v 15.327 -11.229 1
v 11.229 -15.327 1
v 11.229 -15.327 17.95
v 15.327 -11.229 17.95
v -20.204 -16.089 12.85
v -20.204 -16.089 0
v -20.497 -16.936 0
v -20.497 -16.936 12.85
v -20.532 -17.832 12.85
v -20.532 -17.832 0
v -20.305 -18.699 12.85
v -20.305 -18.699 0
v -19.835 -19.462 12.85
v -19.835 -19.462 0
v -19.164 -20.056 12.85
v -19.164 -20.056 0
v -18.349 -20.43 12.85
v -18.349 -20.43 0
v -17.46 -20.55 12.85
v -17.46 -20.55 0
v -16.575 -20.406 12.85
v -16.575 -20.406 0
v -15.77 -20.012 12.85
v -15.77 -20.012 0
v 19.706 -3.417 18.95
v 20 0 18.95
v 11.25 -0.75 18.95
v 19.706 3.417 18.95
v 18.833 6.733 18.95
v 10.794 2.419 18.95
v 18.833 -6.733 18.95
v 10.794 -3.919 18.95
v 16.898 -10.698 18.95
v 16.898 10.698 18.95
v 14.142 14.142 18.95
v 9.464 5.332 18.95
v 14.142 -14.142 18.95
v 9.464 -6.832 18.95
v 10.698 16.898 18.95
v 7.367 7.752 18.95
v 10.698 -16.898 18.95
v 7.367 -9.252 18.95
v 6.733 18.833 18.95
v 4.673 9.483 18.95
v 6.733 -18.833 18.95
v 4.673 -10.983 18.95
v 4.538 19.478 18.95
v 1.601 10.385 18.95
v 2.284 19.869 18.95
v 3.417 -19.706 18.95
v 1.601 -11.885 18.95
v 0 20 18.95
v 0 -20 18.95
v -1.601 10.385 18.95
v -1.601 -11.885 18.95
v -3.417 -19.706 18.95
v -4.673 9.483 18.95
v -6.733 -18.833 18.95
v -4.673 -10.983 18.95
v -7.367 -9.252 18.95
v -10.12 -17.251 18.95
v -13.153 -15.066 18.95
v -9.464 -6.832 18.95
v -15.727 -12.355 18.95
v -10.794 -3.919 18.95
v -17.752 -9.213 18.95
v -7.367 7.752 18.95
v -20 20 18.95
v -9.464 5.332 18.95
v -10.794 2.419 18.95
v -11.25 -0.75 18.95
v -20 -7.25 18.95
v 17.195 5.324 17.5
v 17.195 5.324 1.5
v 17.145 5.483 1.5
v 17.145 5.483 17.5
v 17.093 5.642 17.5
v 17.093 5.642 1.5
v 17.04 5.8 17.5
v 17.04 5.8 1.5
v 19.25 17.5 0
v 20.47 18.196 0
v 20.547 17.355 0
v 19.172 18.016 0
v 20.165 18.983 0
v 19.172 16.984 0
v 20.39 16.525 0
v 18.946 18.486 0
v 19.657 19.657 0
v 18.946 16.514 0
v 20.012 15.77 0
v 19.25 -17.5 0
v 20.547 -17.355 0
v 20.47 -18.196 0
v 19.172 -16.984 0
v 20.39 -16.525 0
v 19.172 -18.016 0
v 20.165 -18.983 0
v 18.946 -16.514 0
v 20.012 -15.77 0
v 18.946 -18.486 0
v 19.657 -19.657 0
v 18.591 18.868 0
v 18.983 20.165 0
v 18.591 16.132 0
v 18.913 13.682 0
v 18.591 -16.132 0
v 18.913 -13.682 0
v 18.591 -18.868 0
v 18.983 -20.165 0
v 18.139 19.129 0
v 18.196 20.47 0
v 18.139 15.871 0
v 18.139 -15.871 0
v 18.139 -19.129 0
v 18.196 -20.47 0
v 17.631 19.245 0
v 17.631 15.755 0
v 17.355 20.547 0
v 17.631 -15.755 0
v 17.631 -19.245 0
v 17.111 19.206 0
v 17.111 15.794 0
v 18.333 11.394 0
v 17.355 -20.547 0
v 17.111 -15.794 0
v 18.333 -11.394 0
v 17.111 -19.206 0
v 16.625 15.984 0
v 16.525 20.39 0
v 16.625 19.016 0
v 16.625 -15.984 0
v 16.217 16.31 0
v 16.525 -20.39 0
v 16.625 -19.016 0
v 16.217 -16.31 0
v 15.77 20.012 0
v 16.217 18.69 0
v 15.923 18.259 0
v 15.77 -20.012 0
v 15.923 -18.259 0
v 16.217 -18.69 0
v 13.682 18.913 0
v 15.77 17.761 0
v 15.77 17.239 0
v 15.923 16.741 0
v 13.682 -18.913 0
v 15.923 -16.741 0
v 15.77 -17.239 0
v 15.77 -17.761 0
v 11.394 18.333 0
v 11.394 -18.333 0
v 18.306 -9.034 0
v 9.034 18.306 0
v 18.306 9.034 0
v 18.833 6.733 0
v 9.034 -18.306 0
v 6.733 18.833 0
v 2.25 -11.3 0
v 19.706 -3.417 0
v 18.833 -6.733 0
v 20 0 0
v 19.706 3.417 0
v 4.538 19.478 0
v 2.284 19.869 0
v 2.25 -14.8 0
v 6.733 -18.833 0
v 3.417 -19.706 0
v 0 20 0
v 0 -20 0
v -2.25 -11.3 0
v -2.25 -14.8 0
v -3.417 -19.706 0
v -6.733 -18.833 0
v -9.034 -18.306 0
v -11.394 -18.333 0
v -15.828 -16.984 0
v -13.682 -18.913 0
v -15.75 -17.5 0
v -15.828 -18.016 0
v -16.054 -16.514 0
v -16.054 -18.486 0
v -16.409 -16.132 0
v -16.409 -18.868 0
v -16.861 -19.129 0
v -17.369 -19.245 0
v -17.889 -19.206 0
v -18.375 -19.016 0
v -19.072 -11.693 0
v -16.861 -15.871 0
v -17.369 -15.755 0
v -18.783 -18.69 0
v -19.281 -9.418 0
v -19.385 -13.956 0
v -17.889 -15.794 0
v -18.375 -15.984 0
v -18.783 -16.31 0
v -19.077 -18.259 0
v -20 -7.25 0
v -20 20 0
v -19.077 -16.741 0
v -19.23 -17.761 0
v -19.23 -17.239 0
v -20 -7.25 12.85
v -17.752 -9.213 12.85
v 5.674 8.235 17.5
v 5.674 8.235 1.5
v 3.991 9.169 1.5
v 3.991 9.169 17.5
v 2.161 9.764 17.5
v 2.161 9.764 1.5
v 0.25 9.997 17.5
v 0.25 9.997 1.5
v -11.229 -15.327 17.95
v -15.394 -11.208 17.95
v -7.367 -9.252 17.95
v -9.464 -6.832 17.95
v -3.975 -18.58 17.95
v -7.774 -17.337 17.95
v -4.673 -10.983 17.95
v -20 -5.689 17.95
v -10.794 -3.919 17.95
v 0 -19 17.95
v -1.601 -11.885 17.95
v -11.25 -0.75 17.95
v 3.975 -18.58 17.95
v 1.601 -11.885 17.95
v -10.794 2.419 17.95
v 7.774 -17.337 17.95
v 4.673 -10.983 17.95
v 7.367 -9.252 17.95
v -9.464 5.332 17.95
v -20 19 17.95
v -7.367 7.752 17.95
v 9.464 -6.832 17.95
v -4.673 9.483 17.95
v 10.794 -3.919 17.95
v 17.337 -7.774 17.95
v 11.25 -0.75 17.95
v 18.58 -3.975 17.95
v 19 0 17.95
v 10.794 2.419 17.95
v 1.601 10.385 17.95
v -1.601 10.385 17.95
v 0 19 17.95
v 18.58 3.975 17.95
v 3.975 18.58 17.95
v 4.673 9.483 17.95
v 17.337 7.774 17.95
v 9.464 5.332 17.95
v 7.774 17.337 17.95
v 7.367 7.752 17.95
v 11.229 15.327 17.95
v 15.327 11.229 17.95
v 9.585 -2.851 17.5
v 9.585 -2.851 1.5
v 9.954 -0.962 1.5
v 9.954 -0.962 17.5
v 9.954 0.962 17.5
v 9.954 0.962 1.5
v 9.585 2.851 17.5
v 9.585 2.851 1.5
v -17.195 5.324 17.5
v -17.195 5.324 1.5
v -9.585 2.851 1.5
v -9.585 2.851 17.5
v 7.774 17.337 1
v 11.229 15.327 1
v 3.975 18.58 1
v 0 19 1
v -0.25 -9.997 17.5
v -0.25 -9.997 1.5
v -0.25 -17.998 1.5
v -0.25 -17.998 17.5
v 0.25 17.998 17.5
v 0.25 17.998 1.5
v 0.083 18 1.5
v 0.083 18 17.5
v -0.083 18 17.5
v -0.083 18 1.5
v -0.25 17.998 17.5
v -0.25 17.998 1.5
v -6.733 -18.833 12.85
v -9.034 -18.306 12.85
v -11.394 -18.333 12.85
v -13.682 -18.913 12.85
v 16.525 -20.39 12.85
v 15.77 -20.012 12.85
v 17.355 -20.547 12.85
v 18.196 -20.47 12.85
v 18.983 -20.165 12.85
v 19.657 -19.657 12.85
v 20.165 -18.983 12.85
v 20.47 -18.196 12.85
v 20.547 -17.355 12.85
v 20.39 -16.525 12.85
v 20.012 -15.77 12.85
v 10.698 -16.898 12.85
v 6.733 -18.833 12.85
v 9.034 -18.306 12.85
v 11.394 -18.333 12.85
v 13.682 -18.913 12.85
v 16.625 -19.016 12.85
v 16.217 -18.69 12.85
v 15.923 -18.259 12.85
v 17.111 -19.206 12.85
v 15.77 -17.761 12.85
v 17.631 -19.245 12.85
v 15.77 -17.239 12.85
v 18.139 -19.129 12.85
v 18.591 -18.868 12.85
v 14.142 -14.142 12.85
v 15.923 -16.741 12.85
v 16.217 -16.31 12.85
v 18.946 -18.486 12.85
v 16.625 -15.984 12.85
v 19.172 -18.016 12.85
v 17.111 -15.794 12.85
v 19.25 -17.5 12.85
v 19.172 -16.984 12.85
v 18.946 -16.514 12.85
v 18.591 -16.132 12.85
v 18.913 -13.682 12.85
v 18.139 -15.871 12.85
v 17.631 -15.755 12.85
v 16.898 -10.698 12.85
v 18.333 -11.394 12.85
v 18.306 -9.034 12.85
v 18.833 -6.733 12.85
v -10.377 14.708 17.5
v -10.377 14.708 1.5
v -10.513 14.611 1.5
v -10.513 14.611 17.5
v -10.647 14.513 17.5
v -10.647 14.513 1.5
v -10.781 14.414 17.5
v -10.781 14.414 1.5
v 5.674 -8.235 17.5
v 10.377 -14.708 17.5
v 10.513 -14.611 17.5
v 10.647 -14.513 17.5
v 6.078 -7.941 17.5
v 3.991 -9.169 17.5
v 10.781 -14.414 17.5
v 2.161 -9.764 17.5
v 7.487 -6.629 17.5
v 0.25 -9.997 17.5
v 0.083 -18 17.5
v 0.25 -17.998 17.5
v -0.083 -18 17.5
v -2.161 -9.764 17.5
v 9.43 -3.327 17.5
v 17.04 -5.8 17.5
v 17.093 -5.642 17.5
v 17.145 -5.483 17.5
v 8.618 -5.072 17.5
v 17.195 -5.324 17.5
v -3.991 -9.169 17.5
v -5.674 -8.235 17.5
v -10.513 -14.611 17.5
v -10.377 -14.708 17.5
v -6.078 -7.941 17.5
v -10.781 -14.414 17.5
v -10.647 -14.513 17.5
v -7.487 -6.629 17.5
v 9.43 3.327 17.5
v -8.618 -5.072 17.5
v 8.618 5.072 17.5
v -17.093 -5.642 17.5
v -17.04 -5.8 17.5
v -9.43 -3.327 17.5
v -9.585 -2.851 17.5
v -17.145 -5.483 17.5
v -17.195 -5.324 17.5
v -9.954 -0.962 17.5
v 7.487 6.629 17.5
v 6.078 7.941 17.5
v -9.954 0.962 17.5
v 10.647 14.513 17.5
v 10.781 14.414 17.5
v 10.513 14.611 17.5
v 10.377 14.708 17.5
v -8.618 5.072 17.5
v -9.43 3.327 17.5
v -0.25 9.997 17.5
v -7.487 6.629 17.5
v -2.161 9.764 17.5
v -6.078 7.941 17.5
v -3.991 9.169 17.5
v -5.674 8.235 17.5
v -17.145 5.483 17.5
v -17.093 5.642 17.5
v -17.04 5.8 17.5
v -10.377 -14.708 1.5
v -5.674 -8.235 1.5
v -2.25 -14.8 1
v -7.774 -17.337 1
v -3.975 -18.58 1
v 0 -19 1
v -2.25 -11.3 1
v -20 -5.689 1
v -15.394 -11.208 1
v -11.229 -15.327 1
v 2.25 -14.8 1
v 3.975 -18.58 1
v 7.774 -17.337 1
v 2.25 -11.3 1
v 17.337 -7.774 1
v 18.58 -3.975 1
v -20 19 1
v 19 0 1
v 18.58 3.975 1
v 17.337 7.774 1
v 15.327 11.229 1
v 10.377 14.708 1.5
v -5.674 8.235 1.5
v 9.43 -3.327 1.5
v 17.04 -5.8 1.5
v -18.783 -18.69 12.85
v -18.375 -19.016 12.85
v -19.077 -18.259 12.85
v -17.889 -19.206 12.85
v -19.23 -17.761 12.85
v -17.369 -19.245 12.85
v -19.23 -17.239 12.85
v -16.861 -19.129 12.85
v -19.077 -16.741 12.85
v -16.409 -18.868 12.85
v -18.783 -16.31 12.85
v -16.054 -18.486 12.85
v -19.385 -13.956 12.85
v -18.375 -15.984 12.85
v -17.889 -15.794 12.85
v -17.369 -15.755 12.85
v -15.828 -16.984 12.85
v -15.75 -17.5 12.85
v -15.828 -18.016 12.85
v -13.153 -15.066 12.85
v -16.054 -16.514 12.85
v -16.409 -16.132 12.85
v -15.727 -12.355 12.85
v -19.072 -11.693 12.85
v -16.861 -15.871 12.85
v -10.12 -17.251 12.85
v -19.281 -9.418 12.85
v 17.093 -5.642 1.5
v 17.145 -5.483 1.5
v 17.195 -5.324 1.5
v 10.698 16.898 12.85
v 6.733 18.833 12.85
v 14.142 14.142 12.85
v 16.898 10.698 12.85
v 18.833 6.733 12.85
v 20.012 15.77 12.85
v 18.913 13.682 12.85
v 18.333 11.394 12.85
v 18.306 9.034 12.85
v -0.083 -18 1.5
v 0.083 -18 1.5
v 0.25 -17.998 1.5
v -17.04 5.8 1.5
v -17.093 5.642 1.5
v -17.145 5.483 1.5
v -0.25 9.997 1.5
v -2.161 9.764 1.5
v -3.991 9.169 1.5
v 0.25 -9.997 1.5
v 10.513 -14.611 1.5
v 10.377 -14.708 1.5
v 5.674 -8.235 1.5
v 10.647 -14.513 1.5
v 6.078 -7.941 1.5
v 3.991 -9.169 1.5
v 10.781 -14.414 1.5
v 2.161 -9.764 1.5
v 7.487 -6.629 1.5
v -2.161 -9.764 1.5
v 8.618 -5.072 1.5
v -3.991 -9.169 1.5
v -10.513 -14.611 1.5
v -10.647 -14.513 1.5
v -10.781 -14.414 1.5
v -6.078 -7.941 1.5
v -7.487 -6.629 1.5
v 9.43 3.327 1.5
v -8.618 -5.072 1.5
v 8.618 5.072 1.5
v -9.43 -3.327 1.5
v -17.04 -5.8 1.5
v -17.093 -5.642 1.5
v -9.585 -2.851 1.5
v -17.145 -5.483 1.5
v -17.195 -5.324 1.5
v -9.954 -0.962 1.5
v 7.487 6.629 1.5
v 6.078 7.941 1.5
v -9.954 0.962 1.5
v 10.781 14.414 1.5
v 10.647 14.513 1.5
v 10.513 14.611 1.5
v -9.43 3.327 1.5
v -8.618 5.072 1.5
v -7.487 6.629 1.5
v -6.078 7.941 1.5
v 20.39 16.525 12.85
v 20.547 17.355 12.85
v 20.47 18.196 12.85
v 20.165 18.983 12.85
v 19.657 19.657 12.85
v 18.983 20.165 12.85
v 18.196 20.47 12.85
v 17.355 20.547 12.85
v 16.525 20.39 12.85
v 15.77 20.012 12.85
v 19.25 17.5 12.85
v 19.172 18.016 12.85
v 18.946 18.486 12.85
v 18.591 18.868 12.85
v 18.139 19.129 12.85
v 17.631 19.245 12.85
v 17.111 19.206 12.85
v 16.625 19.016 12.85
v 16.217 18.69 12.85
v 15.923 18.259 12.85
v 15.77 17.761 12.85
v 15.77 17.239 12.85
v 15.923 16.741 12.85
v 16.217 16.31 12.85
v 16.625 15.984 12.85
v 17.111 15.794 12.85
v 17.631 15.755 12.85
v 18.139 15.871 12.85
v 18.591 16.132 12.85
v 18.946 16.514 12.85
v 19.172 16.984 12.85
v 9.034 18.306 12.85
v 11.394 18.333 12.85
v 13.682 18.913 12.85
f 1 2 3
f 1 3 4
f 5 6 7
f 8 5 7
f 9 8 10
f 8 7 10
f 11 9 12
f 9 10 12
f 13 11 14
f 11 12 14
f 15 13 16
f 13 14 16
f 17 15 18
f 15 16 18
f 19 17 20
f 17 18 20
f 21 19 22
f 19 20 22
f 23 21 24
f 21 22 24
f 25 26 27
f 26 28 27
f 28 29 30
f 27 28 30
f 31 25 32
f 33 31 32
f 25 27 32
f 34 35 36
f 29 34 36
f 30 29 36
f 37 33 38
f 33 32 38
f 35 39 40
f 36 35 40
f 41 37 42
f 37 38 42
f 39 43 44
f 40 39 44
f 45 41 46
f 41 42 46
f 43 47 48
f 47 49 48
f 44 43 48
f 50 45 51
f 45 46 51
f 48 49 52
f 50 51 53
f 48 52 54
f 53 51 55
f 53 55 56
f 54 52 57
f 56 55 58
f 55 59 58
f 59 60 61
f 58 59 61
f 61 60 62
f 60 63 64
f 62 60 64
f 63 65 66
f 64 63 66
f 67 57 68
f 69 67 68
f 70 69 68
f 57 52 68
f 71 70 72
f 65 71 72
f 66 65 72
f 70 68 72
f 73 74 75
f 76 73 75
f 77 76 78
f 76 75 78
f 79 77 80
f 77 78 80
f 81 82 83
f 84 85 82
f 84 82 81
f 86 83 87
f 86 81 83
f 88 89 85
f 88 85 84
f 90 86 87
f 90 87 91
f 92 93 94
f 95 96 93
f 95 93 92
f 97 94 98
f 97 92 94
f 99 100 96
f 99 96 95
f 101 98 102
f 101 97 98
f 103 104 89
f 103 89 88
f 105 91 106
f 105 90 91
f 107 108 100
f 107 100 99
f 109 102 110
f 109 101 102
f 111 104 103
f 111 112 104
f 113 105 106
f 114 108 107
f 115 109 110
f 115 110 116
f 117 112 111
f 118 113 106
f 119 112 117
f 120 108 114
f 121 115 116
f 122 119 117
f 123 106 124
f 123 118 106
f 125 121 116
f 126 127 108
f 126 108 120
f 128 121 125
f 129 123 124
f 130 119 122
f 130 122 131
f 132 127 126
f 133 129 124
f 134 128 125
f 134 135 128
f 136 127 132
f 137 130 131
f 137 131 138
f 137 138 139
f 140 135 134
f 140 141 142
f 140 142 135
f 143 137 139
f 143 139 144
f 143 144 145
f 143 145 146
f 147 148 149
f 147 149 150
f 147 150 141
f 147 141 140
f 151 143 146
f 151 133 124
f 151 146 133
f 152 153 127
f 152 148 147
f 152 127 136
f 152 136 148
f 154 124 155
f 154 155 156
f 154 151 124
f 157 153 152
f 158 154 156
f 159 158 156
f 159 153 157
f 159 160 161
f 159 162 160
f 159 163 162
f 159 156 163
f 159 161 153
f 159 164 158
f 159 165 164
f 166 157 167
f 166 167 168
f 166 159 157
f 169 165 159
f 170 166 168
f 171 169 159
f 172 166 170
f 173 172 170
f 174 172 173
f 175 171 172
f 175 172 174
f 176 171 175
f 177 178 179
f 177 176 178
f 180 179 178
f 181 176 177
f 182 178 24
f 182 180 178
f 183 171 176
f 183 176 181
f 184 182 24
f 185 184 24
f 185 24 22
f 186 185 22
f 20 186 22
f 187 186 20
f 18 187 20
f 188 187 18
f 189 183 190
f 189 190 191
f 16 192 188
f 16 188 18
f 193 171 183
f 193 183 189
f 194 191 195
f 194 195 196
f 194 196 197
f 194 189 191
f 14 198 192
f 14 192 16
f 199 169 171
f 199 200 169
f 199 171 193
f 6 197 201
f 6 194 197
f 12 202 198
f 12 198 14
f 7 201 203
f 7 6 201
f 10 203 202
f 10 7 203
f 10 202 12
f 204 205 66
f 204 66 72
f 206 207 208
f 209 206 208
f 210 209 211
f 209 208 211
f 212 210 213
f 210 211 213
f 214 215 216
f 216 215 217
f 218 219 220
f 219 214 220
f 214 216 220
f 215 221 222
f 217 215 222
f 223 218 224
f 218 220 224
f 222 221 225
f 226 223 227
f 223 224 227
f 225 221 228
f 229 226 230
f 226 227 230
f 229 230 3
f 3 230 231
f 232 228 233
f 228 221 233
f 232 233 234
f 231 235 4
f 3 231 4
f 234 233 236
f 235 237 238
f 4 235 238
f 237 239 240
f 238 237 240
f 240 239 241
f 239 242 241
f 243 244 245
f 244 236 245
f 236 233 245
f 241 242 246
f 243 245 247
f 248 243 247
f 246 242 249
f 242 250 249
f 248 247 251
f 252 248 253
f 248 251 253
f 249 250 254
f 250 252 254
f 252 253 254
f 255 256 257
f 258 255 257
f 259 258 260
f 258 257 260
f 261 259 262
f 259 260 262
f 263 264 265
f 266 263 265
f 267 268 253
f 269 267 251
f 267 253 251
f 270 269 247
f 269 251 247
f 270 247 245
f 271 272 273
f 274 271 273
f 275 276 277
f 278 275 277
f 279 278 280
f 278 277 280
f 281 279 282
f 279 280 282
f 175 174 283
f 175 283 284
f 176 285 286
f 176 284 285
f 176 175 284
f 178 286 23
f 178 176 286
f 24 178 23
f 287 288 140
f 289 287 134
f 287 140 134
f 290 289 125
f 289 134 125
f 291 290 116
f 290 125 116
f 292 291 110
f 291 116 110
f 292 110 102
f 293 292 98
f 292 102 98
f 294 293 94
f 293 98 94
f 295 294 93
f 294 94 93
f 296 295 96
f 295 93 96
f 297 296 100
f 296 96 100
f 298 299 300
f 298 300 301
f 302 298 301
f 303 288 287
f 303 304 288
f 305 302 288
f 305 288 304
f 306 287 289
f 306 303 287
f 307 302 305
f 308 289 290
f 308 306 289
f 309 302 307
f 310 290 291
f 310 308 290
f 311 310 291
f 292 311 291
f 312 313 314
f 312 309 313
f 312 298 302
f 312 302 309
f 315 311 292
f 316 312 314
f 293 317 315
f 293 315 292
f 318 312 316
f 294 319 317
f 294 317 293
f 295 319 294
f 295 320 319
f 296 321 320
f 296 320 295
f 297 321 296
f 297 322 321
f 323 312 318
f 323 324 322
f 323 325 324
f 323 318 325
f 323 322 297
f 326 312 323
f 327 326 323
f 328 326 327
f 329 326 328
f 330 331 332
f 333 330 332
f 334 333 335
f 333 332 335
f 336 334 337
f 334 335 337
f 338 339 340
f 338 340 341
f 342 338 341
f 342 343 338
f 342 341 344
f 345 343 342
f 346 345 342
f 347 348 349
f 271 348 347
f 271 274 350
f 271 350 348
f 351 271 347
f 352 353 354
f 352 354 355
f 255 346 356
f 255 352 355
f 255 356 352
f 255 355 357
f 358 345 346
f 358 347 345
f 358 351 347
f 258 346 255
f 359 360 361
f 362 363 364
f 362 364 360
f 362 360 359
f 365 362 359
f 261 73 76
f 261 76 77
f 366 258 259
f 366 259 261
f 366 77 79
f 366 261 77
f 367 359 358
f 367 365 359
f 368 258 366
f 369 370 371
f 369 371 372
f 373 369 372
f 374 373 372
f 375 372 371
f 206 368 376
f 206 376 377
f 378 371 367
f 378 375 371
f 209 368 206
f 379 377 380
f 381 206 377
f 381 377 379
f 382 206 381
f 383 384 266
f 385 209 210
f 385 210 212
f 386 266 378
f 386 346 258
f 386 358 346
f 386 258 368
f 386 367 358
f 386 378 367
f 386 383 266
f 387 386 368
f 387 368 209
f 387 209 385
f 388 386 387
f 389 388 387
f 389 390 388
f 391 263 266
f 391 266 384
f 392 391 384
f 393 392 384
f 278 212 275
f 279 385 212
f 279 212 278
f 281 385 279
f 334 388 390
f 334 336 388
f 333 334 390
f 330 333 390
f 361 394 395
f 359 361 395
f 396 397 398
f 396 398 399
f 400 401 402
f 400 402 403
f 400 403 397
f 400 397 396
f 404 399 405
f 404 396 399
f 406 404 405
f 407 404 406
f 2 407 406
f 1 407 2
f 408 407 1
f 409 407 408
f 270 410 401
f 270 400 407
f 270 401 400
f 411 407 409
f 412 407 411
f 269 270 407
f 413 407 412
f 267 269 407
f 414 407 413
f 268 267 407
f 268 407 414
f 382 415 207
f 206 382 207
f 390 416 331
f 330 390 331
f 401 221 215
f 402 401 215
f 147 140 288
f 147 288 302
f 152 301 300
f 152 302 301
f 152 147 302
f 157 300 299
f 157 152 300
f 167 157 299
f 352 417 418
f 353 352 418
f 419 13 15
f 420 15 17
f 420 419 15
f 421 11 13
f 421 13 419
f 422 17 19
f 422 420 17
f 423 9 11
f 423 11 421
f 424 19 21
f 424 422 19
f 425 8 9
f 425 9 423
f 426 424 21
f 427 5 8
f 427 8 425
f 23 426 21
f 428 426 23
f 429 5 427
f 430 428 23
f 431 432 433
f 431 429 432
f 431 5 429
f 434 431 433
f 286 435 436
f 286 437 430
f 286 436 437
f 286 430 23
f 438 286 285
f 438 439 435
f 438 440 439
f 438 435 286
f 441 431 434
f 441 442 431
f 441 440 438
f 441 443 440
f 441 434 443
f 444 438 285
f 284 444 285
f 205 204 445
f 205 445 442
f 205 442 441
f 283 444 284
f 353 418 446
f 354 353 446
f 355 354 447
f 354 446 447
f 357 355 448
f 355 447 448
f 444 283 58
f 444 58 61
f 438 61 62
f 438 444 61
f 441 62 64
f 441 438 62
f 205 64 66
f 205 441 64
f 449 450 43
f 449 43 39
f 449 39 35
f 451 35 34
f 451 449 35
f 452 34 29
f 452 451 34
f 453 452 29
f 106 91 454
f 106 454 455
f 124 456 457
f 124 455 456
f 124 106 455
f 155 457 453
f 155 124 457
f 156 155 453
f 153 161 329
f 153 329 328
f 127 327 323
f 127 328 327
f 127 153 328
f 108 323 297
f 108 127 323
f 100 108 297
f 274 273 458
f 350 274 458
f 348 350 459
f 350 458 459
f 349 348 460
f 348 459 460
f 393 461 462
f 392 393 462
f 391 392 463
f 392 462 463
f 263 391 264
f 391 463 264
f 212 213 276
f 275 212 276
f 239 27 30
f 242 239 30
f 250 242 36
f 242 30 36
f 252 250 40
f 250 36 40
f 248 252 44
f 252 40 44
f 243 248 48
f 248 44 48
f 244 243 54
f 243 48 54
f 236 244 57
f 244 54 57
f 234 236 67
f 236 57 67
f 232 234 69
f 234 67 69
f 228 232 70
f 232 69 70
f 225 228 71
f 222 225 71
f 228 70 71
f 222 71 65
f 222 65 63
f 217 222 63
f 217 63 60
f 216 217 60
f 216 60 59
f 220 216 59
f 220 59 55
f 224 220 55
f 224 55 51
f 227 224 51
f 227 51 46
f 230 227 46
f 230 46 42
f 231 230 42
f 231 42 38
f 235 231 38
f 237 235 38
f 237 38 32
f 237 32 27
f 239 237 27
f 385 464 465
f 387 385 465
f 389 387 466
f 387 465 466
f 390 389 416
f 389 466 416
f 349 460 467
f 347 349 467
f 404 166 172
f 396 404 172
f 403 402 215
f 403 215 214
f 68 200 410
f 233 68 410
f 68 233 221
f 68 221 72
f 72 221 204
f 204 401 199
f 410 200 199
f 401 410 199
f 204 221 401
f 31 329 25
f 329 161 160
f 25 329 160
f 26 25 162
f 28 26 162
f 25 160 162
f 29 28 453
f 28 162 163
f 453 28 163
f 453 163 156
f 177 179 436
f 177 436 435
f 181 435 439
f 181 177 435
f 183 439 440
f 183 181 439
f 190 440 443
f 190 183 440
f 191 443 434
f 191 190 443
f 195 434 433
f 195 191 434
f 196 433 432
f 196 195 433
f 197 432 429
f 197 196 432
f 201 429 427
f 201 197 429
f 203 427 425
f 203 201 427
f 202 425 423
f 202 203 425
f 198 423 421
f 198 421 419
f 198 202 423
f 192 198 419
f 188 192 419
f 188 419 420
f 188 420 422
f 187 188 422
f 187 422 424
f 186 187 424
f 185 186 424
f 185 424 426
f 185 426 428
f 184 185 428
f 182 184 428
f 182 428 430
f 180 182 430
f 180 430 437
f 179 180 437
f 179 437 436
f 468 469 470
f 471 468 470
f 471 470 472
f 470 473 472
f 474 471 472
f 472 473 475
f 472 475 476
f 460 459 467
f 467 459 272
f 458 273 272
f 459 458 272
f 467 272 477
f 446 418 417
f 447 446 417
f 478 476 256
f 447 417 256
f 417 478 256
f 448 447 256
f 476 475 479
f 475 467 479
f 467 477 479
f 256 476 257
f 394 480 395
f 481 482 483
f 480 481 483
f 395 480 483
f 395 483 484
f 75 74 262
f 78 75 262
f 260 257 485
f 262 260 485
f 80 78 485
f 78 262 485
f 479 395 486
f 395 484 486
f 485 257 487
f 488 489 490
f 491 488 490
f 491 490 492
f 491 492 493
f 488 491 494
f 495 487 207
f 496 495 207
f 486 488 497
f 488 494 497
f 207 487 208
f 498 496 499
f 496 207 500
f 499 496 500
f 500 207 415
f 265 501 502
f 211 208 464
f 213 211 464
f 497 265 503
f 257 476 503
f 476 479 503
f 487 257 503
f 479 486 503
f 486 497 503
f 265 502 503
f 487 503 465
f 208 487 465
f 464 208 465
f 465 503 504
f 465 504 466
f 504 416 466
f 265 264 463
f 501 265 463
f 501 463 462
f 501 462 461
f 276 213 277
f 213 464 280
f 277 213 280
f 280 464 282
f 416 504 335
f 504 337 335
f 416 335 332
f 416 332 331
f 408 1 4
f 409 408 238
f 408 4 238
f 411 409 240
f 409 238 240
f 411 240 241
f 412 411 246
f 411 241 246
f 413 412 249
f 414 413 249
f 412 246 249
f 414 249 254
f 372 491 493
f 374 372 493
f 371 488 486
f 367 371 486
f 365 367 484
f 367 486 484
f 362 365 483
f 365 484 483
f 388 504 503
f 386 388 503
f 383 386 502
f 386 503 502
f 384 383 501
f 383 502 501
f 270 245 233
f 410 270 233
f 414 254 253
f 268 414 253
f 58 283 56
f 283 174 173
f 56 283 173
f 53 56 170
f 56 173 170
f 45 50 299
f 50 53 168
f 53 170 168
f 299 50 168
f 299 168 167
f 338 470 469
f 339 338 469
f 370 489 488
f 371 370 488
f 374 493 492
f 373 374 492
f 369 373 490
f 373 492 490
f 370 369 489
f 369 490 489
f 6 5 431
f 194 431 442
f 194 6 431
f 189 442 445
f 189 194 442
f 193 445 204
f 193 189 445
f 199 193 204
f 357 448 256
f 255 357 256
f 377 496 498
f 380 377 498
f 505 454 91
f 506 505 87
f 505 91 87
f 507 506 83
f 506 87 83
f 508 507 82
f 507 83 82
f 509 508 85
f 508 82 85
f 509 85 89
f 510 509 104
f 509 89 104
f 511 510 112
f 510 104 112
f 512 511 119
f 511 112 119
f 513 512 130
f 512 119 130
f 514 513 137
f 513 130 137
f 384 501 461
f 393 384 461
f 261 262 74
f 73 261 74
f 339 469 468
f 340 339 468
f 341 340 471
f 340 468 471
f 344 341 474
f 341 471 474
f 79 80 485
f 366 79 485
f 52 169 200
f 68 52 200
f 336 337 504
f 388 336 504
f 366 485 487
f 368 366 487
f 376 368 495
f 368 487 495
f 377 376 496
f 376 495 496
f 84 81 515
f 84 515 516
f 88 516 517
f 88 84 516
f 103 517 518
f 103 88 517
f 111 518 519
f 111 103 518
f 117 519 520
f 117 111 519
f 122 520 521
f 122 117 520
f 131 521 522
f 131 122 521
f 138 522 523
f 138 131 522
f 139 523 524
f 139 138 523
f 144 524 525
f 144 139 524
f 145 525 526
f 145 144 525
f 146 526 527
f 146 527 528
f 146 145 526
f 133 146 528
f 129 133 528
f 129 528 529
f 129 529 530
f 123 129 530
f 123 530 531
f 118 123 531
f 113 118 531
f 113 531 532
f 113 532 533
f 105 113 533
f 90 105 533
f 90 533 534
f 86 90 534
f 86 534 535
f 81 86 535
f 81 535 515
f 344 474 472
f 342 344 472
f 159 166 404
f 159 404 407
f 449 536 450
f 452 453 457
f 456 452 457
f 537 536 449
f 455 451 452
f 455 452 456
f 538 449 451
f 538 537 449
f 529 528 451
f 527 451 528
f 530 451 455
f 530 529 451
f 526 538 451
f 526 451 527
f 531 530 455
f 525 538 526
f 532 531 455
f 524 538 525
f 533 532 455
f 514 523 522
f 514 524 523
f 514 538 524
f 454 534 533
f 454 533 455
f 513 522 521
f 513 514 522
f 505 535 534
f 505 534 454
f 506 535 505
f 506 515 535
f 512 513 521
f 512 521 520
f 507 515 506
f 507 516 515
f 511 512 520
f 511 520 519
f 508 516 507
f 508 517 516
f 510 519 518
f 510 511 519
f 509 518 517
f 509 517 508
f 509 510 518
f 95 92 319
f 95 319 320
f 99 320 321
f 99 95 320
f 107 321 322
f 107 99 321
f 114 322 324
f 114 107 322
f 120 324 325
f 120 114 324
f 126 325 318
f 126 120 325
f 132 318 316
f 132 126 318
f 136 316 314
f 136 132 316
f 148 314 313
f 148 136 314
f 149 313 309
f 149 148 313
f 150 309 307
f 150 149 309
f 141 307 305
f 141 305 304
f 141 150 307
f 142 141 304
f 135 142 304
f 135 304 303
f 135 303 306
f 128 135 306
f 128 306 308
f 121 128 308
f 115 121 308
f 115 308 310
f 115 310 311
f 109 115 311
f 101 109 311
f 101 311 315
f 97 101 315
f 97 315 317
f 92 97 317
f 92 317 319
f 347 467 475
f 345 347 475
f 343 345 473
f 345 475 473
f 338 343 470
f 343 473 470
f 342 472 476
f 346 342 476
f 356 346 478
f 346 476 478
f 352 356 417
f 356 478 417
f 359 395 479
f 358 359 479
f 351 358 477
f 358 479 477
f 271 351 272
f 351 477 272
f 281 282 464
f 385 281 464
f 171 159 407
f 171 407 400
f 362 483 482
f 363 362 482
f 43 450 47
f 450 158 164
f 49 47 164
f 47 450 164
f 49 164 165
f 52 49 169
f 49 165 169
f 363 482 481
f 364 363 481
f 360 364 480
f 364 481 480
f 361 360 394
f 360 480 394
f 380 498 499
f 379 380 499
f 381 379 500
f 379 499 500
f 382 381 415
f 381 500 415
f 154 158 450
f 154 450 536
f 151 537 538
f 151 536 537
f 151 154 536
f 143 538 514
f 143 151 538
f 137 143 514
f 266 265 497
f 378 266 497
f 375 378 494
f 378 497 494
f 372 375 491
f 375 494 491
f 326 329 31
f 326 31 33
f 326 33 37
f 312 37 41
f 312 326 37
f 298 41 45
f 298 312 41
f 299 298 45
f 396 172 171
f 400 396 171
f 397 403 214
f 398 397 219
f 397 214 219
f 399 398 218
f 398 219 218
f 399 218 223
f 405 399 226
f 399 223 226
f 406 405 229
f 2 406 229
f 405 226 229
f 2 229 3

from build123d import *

# Parameters (mm, degrees)
CROQUIS1_R              = 1.75
SALIENTE_EXTRUIR1_DEPTH = 18.95
CROQUIS2_R              = 11.25
CORTAR_EXTRUIR1_DEPTH   = 15.95
CORTAR_EXTRUIR2_DEPTH   = 16.95
REDONDEO1_R             = 10
CORTAR_EXTRUIR3_START   = -6.1
CROQUIS4_R              = 1.75
CORTAR_EXTRUIR3_DEPTH   = 6.1
CORTAR_EXTRUIR4_REACH   = 36.694
CROQUIS7_W              = 4.5
CROQUIS7_H              = 3.5
SALIENTE_EXTRUIR2_START = 0.5
SALIENTE_EXTRUIR2_DEPTH = 16
MATRIZC1_COUNT          = 10


with BuildPart() as part:
    # Croquis1 → Saliente-Extruir1 (new body)
    with BuildSketch(Plane.XY):
        with BuildLine():
            Line((0, 20), (-20, 20))
            Line((-20, 20), (-20, -7.25))
            Line((-20, -7.25), (-16.161775697, -11.848424332))
            Line((-16.161775697, -11.848424332), (-19.656675683, -15.343324317))
            ThreePointArc((-19.656675683, -15.343324317), (-19.656675683, -19.656675683), (-15.343324317, -19.656675683))
            Line((-15.343324317, -19.656675683), (-11.820046036, -16.133397401))
            ThreePointArc((-11.820046036, -16.133397401), (0, -20), (11.820046036, -16.133397401))
            Line((11.820046036, -16.133397401), (15.343324317, -19.656675683))
            ThreePointArc((15.343324317, -19.656675683), (19.656675683, -19.656675683), (19.656675683, -15.343324317))
            Line((19.656675683, -15.343324317), (16.133397401, -11.820046036))
            ThreePointArc((16.133397401, -11.820046036), (20, 0), (16.133397401, 11.820046036))
            Line((16.133397401, 11.820046036), (19.656675683, 15.343324317))
            ThreePointArc((19.656675683, 15.343324317), (19.656675683, 19.656675683), (15.343324317, 19.656675683))
            Line((15.343324317, 19.656675683), (11.820046036, 16.133397401))
            ThreePointArc((11.820046036, 16.133397401), (6.218201186, 19.008786758), (0, 20))
        make_face()
        with Locations((17.5, 17.5)):
            Circle(CROQUIS1_R, mode=Mode.SUBTRACT)
        with Locations((17.5, -17.5)):
            Circle(CROQUIS1_R, mode=Mode.SUBTRACT)
        with Locations((-17.5, -17.5)):
            Circle(CROQUIS1_R, mode=Mode.SUBTRACT)
    extrude(amount=SALIENTE_EXTRUIR1_DEPTH)

    # Croquis2 → Cortar-Extruir1 (cut)
    with BuildSketch(Plane.XY.offset(18.95)):
        with Locations((0, -0.75)):
            Circle(CROQUIS2_R)
    extrude(amount=-CORTAR_EXTRUIR1_DEPTH, mode=Mode.SUBTRACT)

    # Croquis3 → Cortar-Extruir2 (cut)
    with BuildSketch(Plane.XY.offset(17.95)):
        with BuildLine():
            Line((-20, 19), (-20, -5.689439655))
            Line((-20, -5.689439655), (-15.394064055, -11.207628862))
            Line((-15.394064055, -11.207628862), (-11.229043734, -15.326727531))
            ThreePointArc((-11.229043734, -15.326727531), (0, -19), (11.229043734, -15.326727531))
            Line((11.229043734, -15.326727531), (15.326727531, -11.229043734))
            ThreePointArc((15.326727531, -11.229043734), (19, 0), (15.326727531, 11.229043734))
            Line((15.326727531, 11.229043734), (11.229043734, 15.326727531))
            ThreePointArc((11.229043734, 15.326727531), (5.907291127, 18.05834742), (0, 19))
            Line((0, 19), (-20, 19))
        make_face()
    extrude(amount=-CORTAR_EXTRUIR2_DEPTH, mode=Mode.SUBTRACT)

    # Redondeo1
    # the kernel refuses this fillet: 10 mm, written as the material it adds along each edge
    with BuildSketch(Plane(origin=(11.820046036, 16.133397401, 0), x_dir=(0.7135427704128318, 0.700611671892198, 0), z_dir=(0, 0, 1)), Plane(origin=(-11.820046036, -16.133397401, 0), x_dir=(-0.7135427704128318, -0.7006116718921981, 0), z_dir=(0, 0, 1)), Plane(origin=(16.133397401, -11.820046036, 0), x_dir=(0.700611671892198, -0.7135427704128318, 0), z_dir=(0, 0, 1))) as redondeo1_piece_1:
        with BuildLine():
            CenterArc((7.26065151, 9.850205373), REDONDEO1_R, 205.850666245, 54.219788289)
            Line((-1.738683967, 5.489934627), (-2.638617515, 5.053907553))
            ThreePointArc((-2.638617515, 5.053907553), (-1.624046999, 2.505949256), (-0.986867746, -0.161530343))
            Line((-0.986867746, -0.161530343), (0.009143667, -0.999958196))
            ThreePointArc((0.009143667, -0.999958196), (4.991603301, -0.954398337), (5.363843801, -0.985020537))
            Line((5.363843801, -0.985020537), (5.536280865, 0))
        make_face()
    extrude(amount=18.95)
    with BuildSketch(Plane(origin=(-16.161775697, -11.848424332, 0), x_dir=(-0.6407954702389175, 0.7677116420383924, 0), z_dir=(0, 0, 1))) as redondeo1_piece_2_section:
        with BuildLine():
            CenterArc((8.567409361, 9.662082083), REDONDEO1_R, 202.59121969, 52.471420127)
            Line((-0.665281617, 5.820543678), (-1.588550714, 5.436389838))
            ThreePointArc((-1.588550714, 5.436389838), (-1.439524257, 4.832848201), (-0.99596493, -0.089743286))
            Line((-0.99596493, -0.089743286), (0, -1))
            ThreePointArc((0, -1), (2.994890321, -1), (5.73201777, -0.966208208))
            Line((5.73201777, -0.966208208), (5.989780642, 0))
        make_face()
    redondeo1_piece_2 = extrude(amount=18.95, mode=Mode.PRIVATE)
    redondeo1_piece_2 = split(redondeo1_piece_2, bisect_by=Plane(origin=(-17.114557991, -9.506104322, 0.5), z_dir=(-0.7031762473130518, -0.7110155871812753, 0)), keep=Keep.TOP, mode=Mode.PRIVATE)
    add(redondeo1_piece_2)
    with BuildSketch(Plane(origin=(11.820046036, -16.133397401, 0), x_dir=(-0.8833512154109235, -0.4687116706804344, 0), z_dir=(0, 0, 1))) as redondeo1_piece_3:
        with BuildLine():
            CenterArc((7.198350956, 9.895824864), REDONDEO1_R, 207.502745576, 54.219788289)
            Line((-1.671536099, 5.277913687), (-2.558524804, 4.81612257))
            ThreePointArc((-2.558524804, 4.81612257), (-2.416943338, 4.470499368), (-0.956052835, -0.293194434))
            Line((-0.956052835, -0.293194434), (0.143967019, -0.989582486))
            ThreePointArc((0.143967019, -0.989582486), (2.879340382, -0.791649728), (5.614713746, -0.989582486))
            Line((5.614713746, -0.989582486), (5.758680765, 0))
        make_face()
    extrude(amount=18.95)
    with BuildSketch(Plane(origin=(16.133397401, 11.820046036, 0), x_dir=(0.7006116718921972, 0.7135427704128325, 0), z_dir=(0, 0, 1))) as redondeo1_piece_4:
        with BuildLine():
            CenterArc((7.26065151, -9.850205373), REDONDEO1_R, 99.929545466, 54.219788289)
            Line((-1.738683967, -5.489934627), (-2.638617515, -5.053907553))
            ThreePointArc((-2.638617515, -5.053907553), (-1.624046999, -2.505949256), (-0.986867746, 0.161530343))
            Line((-0.986867746, 0.161530343), (0.009143667, 0.999958196))
            ThreePointArc((0.009143667, 0.999958196), (4.991603301, 0.954398337), (5.363843801, 0.985020537))
            Line((5.363843801, 0.985020537), (5.536280865, 0))
        make_face()
    extrude(amount=18.95)

    # Croquis4 → Cortar-Extruir3 (cut)
    # profile 1 of 3: a face of its own
    with BuildSketch(Plane.XY.offset(18.95).offset(CORTAR_EXTRUIR3_START)):
        with BuildLine():
            Line((-17.751717357, -9.21284597), (-20, -7.25))
            ThreePointArc((-20, -7.25), (-19.072087099, -11.69323902), (-20.203965396, -16.088946798))
            ThreePointArc((-20.203965396, -16.088946798), (-19.521211718, -19.784119785), (-15.770419222, -20.012180394))
            ThreePointArc((-15.770419222, -20.012180394), (-11.393963282, -18.332951904), (-6.733108383, -18.832558283))
            ThreePointArc((-6.733108383, -18.832558283), (-13.153379381, -15.066141207), (-17.751717357, -9.21284597))
        make_face()
        with Locations((-17.5, -17.5)):
            Circle(CROQUIS4_R, mode=Mode.SUBTRACT)
    # profile 2 of 3: a face of its own
    with BuildSketch(Plane.XY.offset(18.95).offset(CORTAR_EXTRUIR3_START)):
        with BuildLine():
            ThreePointArc((18.832558283, -6.733108383), (14.142135624, -14.142135624), (6.733108383, -18.832558283))
            ThreePointArc((6.733108383, -18.832558283), (11.393963282, -18.332951904), (15.770419222, -20.012180394))
            ThreePointArc((15.770419222, -20.012180394), (19.656675683, -19.656675683), (20.012180394, -15.770419222))
            ThreePointArc((20.012180394, -15.770419222), (18.332951904, -11.393963282), (18.832558283, -6.733108383))
        make_face()
        with Locations((17.5, -17.5)):
            Circle(CROQUIS4_R, mode=Mode.SUBTRACT)
    # profile 3 of 3: a face of its own
    with BuildSketch(Plane.XY.offset(18.95).offset(CORTAR_EXTRUIR3_START)):
        with BuildLine():
            ThreePointArc((15.770419222, 20.012180394), (11.393963282, 18.332951904), (6.733108383, 18.832558283))
            ThreePointArc((6.733108383, 18.832558283), (14.142135624, 14.142135624), (18.832558283, 6.733108383))
            ThreePointArc((18.832558283, 6.733108383), (18.332951904, 11.393963282), (20.012180394, 15.770419222))
            ThreePointArc((20.012180394, 15.770419222), (19.656675683, 19.656675683), (15.770419222, 20.012180394))
        make_face()
        with Locations((17.5, 17.5)):
            Circle(CROQUIS4_R, mode=Mode.SUBTRACT)
    extrude(amount=CORTAR_EXTRUIR3_DEPTH, mode=Mode.SUBTRACT)

    # Croquis7 → Cortar-Extruir4 (cut, up to next)
    with BuildSketch(Plane(origin=(0, 0, 0), x_dir=(-1, 0, 0), z_dir=(0, 0, -1)), mode=Mode.PRIVATE) as cortar_extruir4_sk1:
        with Locations((0, -13.05)):
            Rectangle(CROQUIS7_W, CROQUIS7_H)
    cortar_extruir4_tool1 = extrude(cortar_extruir4_sk1.sketch, amount=-CORTAR_EXTRUIR4_REACH, mode=Mode.PRIVATE) & part.part
    add(cortar_extruir4_tool1.solids().sort_by_distance((0, -13.05, 0))[0], mode=Mode.SUBTRACT)


with BuildPart() as body_2:
    # Croquis8 → Saliente-Extruir2 (new body)
    with BuildSketch(Plane.XY.offset(1).offset(SALIENTE_EXTRUIR2_START)):
        with BuildLine():
            Line((-0.25, 17.998263805), (-0.25, 9.996874512))
            Line((-0.25, 9.996874512), (0, 0))
            Line((0, 0), (5.673761158, 8.234587684))
            ThreePointArc((5.673761158, 8.234587684), (3.090169944, 9.510565163), (0.25, 9.996874512))
            Line((0.25, 9.996874512), (0.25, 17.998263805))
            ThreePointArc((0.25, 17.998263805), (0, 18), (-0.25, 17.998263805))
        make_face()
    extrude(amount=SALIENTE_EXTRUIR2_DEPTH)


with BuildPart() as matrizc1_1:
    # MatrizC1: pattern copy
    add(body_2.part.rotate(Axis((0, 0, 0), (0, 0, 1)), 1 * 360 / MATRIZC1_COUNT))


with BuildPart() as matrizc1_2:
    # MatrizC1: pattern copy
    add(body_2.part.rotate(Axis((0, 0, 0), (0, 0, 1)), 2 * 360 / MATRIZC1_COUNT))


with BuildPart() as matrizc1_3:
    # MatrizC1: pattern copy
    add(body_2.part.rotate(Axis((0, 0, 0), (0, 0, 1)), 3 * 360 / MATRIZC1_COUNT))


with BuildPart() as matrizc1_4:
    # MatrizC1: pattern copy
    add(body_2.part.rotate(Axis((0, 0, 0), (0, 0, 1)), 4 * 360 / MATRIZC1_COUNT))


with BuildPart() as matrizc1_5:
    # MatrizC1: pattern copy
    add(body_2.part.rotate(Axis((0, 0, 0), (0, 0, 1)), 5 * 360 / MATRIZC1_COUNT))


with BuildPart() as matrizc1_6:
    # MatrizC1: pattern copy
    add(body_2.part.rotate(Axis((0, 0, 0), (0, 0, 1)), 6 * 360 / MATRIZC1_COUNT))


with BuildPart() as matrizc1_7:
    # MatrizC1: pattern copy
    add(body_2.part.rotate(Axis((0, 0, 0), (0, 0, 1)), 7 * 360 / MATRIZC1_COUNT))


with BuildPart() as matrizc1_8:
    # MatrizC1: pattern copy
    add(body_2.part.rotate(Axis((0, 0, 0), (0, 0, 1)), 8 * 360 / MATRIZC1_COUNT))


with BuildPart() as matrizc1_9:
    # MatrizC1: pattern copy
    add(body_2.part.rotate(Axis((0, 0, 0), (0, 0, 1)), 9 * 360 / MATRIZC1_COUNT))


with BuildPart() as matrizc1_1_1:
    add(matrizc1_1.part)

    # Combinar1: union body 2, MatrizC1_9, MatrizC1_8, MatrizC1_7, MatrizC1_6, MatrizC1_5, MatrizC1_4, MatrizC1_3, MatrizC1_2
    add(body_2.part)
    add(matrizc1_9.part)
    add(matrizc1_8.part)
    add(matrizc1_7.part)
    add(matrizc1_6.part)
    add(matrizc1_5.part)
    add(matrizc1_4.part)
    add(matrizc1_3.part)
    add(matrizc1_2.part)


solid = Compound([part.part, matrizc1_1_1.part])
